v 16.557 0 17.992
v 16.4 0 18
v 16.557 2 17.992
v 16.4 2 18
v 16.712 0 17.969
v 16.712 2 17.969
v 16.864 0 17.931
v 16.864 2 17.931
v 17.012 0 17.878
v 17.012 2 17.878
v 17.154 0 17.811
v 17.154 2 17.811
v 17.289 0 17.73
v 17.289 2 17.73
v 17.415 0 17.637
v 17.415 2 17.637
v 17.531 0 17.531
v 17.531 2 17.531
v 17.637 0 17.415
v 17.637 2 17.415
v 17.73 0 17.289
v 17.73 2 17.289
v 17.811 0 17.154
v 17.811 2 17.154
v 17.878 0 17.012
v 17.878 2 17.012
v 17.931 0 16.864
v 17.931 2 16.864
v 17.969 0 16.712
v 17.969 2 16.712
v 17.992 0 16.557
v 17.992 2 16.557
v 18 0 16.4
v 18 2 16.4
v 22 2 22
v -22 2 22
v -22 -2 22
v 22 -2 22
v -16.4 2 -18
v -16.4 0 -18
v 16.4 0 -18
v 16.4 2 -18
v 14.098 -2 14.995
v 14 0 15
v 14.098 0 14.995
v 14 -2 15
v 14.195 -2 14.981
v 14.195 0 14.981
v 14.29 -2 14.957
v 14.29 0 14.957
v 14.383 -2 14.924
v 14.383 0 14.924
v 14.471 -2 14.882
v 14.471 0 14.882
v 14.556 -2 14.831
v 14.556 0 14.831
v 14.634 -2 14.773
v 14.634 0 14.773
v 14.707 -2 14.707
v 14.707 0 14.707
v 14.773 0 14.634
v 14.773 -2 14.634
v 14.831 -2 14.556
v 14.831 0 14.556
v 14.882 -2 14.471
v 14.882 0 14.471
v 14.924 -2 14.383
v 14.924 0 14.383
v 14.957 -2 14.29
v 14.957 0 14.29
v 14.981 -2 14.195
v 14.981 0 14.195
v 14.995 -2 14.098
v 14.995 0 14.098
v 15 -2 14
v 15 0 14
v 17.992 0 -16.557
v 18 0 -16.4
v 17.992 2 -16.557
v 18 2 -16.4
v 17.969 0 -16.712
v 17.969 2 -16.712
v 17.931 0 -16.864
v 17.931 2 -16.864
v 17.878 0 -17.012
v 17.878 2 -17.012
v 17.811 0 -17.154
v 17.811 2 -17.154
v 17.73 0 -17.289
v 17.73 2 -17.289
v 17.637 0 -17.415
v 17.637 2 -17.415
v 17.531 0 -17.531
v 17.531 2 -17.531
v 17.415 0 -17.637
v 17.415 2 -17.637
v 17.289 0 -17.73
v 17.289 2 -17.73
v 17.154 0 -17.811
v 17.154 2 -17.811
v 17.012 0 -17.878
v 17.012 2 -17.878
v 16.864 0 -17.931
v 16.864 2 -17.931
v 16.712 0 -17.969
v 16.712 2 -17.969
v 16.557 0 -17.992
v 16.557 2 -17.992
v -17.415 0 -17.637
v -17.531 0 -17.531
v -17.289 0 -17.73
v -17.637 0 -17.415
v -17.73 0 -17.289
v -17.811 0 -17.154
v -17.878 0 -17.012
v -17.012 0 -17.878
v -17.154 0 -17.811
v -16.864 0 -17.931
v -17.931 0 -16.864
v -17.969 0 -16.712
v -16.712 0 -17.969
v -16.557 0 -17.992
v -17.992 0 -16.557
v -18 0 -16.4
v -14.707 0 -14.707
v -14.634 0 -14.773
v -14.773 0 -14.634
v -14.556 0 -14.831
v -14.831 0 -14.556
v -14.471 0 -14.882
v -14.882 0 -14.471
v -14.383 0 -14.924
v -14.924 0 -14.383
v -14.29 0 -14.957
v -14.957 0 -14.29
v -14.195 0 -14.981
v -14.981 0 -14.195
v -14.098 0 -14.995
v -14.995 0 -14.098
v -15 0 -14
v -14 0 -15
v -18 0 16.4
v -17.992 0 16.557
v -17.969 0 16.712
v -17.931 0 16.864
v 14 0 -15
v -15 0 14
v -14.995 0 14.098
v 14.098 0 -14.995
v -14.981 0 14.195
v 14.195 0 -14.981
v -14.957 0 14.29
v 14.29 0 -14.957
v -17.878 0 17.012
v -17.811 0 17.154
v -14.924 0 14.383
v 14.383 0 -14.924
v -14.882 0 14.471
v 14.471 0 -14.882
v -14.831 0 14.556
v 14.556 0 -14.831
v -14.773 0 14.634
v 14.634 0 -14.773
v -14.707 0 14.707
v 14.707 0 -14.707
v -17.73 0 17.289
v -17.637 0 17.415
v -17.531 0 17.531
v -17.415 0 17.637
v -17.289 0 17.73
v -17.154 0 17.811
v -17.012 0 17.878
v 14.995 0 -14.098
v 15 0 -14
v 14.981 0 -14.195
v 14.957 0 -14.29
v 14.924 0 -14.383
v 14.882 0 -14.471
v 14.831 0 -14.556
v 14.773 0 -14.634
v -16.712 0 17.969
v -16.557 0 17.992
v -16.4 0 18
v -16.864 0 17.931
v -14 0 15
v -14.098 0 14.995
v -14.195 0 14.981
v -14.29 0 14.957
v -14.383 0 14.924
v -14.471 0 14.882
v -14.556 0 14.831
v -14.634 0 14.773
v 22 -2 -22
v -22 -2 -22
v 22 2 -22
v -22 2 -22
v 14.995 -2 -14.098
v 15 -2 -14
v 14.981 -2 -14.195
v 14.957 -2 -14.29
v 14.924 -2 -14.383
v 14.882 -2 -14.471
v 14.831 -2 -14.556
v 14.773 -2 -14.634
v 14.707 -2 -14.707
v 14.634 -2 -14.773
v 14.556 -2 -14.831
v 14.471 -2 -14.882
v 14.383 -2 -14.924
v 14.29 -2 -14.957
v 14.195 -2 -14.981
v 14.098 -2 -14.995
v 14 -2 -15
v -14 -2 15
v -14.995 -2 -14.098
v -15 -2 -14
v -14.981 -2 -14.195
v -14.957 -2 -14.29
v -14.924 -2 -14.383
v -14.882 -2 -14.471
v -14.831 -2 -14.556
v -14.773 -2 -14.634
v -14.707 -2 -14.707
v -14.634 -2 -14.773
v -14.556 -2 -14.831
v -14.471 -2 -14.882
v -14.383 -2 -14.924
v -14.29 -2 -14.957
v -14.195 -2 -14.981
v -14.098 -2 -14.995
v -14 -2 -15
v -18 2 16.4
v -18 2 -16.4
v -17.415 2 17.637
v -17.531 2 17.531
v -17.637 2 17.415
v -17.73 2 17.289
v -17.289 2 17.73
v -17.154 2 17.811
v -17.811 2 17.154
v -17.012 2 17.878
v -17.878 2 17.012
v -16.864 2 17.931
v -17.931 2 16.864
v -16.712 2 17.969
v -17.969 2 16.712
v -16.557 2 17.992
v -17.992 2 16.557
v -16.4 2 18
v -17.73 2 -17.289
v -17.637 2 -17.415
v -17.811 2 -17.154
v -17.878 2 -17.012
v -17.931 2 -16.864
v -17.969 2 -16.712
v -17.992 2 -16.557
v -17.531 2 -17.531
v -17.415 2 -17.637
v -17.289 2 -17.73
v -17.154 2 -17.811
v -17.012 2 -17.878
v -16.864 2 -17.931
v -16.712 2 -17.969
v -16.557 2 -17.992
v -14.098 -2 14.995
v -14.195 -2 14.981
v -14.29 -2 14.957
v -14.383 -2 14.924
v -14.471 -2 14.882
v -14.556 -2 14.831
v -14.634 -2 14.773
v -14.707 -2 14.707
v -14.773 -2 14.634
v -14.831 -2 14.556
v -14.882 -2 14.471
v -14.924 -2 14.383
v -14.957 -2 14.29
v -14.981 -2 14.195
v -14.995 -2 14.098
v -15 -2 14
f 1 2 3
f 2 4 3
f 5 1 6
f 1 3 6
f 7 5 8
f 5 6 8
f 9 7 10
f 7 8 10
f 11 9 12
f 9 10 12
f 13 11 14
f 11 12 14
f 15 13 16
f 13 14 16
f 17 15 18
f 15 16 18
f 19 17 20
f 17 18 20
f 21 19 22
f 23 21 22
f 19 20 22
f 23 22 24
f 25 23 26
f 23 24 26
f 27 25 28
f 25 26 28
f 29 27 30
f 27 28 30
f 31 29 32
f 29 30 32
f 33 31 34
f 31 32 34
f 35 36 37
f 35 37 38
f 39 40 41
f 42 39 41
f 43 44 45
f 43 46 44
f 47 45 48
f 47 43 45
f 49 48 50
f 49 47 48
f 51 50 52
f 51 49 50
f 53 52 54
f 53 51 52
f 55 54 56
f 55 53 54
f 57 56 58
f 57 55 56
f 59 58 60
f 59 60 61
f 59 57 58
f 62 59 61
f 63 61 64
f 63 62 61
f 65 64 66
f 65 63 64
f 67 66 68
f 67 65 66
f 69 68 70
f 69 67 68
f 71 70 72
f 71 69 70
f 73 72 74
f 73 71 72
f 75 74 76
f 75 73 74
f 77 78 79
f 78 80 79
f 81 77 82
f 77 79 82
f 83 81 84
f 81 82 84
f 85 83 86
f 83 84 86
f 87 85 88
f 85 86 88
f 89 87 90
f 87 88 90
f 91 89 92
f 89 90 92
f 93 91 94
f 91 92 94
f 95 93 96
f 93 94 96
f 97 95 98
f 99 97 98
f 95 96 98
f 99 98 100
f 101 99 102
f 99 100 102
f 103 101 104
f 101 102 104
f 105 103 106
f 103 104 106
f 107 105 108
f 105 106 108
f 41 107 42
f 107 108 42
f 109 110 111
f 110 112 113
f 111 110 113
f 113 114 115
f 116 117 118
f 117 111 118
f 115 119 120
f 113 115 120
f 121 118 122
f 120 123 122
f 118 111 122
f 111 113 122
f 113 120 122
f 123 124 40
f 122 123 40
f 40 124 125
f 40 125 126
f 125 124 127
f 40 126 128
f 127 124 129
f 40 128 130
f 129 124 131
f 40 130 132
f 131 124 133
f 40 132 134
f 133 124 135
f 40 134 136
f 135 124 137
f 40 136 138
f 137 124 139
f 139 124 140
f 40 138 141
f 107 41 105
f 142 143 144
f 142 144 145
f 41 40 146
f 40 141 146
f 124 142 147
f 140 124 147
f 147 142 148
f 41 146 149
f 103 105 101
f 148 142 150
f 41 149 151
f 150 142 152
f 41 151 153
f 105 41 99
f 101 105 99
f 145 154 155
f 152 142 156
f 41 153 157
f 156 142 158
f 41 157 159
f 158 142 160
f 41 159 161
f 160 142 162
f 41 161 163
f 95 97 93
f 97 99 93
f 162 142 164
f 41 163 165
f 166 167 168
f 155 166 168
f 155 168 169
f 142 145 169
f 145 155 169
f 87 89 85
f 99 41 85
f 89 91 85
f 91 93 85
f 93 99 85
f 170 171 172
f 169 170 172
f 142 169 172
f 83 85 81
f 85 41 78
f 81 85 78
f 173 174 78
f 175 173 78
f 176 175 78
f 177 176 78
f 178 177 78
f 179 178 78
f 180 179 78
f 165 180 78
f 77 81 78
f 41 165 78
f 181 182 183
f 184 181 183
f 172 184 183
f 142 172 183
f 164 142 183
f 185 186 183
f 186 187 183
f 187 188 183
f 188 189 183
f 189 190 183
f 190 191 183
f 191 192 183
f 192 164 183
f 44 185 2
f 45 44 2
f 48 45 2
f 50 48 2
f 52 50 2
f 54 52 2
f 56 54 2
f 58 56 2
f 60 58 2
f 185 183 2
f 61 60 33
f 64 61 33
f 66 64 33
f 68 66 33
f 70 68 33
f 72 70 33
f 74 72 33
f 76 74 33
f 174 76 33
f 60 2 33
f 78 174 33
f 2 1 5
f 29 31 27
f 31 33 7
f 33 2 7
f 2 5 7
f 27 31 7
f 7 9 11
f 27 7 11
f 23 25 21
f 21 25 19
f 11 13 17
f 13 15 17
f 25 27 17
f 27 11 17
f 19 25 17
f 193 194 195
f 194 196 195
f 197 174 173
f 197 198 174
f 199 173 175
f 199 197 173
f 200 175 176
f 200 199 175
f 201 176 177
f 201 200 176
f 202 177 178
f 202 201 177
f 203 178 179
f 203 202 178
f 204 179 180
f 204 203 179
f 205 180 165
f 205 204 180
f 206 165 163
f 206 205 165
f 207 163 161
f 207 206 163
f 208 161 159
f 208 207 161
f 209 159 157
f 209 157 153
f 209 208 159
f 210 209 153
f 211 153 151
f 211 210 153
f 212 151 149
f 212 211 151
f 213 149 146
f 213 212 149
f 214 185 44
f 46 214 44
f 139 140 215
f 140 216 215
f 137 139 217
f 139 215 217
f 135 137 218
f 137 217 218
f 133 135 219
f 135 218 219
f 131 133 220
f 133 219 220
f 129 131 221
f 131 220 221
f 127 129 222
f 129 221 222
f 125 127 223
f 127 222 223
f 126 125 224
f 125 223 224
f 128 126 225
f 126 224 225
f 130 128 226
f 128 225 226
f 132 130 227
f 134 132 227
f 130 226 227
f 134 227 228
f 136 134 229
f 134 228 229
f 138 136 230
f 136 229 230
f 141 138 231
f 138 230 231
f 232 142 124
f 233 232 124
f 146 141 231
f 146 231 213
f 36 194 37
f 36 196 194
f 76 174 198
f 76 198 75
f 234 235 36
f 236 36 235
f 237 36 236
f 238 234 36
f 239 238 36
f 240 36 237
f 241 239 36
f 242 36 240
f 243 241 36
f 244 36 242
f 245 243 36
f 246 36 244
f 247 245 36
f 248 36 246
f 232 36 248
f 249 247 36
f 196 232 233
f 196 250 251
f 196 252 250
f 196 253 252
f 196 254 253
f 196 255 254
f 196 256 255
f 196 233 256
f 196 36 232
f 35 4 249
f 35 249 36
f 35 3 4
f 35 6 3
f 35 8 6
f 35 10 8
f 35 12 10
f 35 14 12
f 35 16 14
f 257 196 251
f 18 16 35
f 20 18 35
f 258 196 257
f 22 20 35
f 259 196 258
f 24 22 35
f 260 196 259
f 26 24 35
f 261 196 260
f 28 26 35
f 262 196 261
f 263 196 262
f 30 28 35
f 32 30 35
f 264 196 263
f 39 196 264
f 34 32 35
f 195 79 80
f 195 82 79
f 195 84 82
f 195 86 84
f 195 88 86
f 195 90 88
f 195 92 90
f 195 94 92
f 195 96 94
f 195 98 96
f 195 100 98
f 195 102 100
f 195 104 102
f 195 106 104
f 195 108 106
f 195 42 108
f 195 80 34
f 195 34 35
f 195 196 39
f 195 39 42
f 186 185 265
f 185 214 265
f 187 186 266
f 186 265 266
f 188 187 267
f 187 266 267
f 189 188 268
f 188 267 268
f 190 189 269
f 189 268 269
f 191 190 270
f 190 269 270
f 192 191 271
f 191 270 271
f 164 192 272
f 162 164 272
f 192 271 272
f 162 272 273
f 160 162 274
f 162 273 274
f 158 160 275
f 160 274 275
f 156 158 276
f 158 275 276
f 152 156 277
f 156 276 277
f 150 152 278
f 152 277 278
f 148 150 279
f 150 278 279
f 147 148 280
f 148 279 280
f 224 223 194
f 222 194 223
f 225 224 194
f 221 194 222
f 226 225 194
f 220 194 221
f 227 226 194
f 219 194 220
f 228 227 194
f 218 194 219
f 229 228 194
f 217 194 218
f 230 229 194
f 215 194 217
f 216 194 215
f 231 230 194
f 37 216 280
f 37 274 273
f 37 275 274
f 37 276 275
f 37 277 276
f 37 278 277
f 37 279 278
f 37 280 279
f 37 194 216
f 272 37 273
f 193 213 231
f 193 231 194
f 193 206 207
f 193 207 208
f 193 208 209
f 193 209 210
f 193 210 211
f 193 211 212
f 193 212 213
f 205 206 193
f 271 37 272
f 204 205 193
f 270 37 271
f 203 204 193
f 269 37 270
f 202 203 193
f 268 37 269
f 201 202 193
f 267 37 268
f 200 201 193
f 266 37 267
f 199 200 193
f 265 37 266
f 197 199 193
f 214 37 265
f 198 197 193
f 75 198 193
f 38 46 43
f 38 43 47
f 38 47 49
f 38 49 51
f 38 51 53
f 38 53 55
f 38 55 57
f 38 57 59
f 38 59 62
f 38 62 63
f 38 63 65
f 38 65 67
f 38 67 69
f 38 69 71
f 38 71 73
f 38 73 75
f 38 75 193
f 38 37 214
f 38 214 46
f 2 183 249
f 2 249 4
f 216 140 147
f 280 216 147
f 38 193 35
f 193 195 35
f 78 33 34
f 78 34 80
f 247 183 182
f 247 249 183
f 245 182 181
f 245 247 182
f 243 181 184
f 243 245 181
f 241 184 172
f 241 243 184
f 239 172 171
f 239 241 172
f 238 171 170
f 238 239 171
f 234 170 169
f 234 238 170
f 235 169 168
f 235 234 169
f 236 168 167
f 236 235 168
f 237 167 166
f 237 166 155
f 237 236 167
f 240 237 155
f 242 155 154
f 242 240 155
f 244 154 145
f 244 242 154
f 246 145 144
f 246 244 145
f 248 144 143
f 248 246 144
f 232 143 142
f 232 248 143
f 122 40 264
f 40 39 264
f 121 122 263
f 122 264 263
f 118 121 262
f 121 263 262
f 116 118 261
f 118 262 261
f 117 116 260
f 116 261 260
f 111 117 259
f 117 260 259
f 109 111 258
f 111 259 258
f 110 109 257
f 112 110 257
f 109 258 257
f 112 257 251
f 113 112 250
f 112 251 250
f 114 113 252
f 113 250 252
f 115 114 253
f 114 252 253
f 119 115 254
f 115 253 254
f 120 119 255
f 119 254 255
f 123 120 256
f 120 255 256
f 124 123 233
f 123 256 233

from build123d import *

# Parameters (mm, degrees)
SKETCH1_W           = 44
SKETCH1_H           = 44
SKETCH1_W_2         = 36
SKETCH1_H_2         = 36
BOSS_EXTRUDE1_DEPTH = 2
FILLET1_R           = 1.6
SKETCH2_W           = 44
SKETCH2_H           = 44
SKETCH2_W_2         = 30
SKETCH2_H_2         = 30
BOSS_EXTRUDE2_DEPTH = 2
FILLET2_R           = 1


with BuildPart() as part:
    # Sketch1 → Boss-Extrude1 (new body)
    with BuildSketch(Plane(origin=(0, 0, 0), x_dir=(1, 0, 0), z_dir=(0, 1, 0))):
        Rectangle(SKETCH1_W, SKETCH1_H)
        Rectangle(SKETCH1_W_2, SKETCH1_H_2, mode=Mode.SUBTRACT)
    extrude(amount=BOSS_EXTRUDE1_DEPTH)

    # Fillet1
    fillet1_edges = [part.edges().sort_by_distance(p)[0] for p in [
        (18, 1, -18),
        (-18, 1, -18),
        (-18, 1, 18),
        (18, 1, 18),
    ]]
    fillet(fillet1_edges, radius=FILLET1_R)

    # Sketch2 → Boss-Extrude2 (add)
    with BuildSketch(Plane.XZ):
        Rectangle(SKETCH2_W, SKETCH2_H)
        Rectangle(SKETCH2_W_2, SKETCH2_H_2, mode=Mode.SUBTRACT)
    extrude(amount=BOSS_EXTRUDE2_DEPTH)

    # Fillet2
    fillet2_edges = [part.edges().sort_by_distance(p)[0] for p in [
        (15, -1, 15),
        (-15, -1, 15),
        (-15, -1, -15),
        (15, -1, -15),
    ]]
    fillet(fillet2_edges, radius=FILLET2_R)


solid = part.part
